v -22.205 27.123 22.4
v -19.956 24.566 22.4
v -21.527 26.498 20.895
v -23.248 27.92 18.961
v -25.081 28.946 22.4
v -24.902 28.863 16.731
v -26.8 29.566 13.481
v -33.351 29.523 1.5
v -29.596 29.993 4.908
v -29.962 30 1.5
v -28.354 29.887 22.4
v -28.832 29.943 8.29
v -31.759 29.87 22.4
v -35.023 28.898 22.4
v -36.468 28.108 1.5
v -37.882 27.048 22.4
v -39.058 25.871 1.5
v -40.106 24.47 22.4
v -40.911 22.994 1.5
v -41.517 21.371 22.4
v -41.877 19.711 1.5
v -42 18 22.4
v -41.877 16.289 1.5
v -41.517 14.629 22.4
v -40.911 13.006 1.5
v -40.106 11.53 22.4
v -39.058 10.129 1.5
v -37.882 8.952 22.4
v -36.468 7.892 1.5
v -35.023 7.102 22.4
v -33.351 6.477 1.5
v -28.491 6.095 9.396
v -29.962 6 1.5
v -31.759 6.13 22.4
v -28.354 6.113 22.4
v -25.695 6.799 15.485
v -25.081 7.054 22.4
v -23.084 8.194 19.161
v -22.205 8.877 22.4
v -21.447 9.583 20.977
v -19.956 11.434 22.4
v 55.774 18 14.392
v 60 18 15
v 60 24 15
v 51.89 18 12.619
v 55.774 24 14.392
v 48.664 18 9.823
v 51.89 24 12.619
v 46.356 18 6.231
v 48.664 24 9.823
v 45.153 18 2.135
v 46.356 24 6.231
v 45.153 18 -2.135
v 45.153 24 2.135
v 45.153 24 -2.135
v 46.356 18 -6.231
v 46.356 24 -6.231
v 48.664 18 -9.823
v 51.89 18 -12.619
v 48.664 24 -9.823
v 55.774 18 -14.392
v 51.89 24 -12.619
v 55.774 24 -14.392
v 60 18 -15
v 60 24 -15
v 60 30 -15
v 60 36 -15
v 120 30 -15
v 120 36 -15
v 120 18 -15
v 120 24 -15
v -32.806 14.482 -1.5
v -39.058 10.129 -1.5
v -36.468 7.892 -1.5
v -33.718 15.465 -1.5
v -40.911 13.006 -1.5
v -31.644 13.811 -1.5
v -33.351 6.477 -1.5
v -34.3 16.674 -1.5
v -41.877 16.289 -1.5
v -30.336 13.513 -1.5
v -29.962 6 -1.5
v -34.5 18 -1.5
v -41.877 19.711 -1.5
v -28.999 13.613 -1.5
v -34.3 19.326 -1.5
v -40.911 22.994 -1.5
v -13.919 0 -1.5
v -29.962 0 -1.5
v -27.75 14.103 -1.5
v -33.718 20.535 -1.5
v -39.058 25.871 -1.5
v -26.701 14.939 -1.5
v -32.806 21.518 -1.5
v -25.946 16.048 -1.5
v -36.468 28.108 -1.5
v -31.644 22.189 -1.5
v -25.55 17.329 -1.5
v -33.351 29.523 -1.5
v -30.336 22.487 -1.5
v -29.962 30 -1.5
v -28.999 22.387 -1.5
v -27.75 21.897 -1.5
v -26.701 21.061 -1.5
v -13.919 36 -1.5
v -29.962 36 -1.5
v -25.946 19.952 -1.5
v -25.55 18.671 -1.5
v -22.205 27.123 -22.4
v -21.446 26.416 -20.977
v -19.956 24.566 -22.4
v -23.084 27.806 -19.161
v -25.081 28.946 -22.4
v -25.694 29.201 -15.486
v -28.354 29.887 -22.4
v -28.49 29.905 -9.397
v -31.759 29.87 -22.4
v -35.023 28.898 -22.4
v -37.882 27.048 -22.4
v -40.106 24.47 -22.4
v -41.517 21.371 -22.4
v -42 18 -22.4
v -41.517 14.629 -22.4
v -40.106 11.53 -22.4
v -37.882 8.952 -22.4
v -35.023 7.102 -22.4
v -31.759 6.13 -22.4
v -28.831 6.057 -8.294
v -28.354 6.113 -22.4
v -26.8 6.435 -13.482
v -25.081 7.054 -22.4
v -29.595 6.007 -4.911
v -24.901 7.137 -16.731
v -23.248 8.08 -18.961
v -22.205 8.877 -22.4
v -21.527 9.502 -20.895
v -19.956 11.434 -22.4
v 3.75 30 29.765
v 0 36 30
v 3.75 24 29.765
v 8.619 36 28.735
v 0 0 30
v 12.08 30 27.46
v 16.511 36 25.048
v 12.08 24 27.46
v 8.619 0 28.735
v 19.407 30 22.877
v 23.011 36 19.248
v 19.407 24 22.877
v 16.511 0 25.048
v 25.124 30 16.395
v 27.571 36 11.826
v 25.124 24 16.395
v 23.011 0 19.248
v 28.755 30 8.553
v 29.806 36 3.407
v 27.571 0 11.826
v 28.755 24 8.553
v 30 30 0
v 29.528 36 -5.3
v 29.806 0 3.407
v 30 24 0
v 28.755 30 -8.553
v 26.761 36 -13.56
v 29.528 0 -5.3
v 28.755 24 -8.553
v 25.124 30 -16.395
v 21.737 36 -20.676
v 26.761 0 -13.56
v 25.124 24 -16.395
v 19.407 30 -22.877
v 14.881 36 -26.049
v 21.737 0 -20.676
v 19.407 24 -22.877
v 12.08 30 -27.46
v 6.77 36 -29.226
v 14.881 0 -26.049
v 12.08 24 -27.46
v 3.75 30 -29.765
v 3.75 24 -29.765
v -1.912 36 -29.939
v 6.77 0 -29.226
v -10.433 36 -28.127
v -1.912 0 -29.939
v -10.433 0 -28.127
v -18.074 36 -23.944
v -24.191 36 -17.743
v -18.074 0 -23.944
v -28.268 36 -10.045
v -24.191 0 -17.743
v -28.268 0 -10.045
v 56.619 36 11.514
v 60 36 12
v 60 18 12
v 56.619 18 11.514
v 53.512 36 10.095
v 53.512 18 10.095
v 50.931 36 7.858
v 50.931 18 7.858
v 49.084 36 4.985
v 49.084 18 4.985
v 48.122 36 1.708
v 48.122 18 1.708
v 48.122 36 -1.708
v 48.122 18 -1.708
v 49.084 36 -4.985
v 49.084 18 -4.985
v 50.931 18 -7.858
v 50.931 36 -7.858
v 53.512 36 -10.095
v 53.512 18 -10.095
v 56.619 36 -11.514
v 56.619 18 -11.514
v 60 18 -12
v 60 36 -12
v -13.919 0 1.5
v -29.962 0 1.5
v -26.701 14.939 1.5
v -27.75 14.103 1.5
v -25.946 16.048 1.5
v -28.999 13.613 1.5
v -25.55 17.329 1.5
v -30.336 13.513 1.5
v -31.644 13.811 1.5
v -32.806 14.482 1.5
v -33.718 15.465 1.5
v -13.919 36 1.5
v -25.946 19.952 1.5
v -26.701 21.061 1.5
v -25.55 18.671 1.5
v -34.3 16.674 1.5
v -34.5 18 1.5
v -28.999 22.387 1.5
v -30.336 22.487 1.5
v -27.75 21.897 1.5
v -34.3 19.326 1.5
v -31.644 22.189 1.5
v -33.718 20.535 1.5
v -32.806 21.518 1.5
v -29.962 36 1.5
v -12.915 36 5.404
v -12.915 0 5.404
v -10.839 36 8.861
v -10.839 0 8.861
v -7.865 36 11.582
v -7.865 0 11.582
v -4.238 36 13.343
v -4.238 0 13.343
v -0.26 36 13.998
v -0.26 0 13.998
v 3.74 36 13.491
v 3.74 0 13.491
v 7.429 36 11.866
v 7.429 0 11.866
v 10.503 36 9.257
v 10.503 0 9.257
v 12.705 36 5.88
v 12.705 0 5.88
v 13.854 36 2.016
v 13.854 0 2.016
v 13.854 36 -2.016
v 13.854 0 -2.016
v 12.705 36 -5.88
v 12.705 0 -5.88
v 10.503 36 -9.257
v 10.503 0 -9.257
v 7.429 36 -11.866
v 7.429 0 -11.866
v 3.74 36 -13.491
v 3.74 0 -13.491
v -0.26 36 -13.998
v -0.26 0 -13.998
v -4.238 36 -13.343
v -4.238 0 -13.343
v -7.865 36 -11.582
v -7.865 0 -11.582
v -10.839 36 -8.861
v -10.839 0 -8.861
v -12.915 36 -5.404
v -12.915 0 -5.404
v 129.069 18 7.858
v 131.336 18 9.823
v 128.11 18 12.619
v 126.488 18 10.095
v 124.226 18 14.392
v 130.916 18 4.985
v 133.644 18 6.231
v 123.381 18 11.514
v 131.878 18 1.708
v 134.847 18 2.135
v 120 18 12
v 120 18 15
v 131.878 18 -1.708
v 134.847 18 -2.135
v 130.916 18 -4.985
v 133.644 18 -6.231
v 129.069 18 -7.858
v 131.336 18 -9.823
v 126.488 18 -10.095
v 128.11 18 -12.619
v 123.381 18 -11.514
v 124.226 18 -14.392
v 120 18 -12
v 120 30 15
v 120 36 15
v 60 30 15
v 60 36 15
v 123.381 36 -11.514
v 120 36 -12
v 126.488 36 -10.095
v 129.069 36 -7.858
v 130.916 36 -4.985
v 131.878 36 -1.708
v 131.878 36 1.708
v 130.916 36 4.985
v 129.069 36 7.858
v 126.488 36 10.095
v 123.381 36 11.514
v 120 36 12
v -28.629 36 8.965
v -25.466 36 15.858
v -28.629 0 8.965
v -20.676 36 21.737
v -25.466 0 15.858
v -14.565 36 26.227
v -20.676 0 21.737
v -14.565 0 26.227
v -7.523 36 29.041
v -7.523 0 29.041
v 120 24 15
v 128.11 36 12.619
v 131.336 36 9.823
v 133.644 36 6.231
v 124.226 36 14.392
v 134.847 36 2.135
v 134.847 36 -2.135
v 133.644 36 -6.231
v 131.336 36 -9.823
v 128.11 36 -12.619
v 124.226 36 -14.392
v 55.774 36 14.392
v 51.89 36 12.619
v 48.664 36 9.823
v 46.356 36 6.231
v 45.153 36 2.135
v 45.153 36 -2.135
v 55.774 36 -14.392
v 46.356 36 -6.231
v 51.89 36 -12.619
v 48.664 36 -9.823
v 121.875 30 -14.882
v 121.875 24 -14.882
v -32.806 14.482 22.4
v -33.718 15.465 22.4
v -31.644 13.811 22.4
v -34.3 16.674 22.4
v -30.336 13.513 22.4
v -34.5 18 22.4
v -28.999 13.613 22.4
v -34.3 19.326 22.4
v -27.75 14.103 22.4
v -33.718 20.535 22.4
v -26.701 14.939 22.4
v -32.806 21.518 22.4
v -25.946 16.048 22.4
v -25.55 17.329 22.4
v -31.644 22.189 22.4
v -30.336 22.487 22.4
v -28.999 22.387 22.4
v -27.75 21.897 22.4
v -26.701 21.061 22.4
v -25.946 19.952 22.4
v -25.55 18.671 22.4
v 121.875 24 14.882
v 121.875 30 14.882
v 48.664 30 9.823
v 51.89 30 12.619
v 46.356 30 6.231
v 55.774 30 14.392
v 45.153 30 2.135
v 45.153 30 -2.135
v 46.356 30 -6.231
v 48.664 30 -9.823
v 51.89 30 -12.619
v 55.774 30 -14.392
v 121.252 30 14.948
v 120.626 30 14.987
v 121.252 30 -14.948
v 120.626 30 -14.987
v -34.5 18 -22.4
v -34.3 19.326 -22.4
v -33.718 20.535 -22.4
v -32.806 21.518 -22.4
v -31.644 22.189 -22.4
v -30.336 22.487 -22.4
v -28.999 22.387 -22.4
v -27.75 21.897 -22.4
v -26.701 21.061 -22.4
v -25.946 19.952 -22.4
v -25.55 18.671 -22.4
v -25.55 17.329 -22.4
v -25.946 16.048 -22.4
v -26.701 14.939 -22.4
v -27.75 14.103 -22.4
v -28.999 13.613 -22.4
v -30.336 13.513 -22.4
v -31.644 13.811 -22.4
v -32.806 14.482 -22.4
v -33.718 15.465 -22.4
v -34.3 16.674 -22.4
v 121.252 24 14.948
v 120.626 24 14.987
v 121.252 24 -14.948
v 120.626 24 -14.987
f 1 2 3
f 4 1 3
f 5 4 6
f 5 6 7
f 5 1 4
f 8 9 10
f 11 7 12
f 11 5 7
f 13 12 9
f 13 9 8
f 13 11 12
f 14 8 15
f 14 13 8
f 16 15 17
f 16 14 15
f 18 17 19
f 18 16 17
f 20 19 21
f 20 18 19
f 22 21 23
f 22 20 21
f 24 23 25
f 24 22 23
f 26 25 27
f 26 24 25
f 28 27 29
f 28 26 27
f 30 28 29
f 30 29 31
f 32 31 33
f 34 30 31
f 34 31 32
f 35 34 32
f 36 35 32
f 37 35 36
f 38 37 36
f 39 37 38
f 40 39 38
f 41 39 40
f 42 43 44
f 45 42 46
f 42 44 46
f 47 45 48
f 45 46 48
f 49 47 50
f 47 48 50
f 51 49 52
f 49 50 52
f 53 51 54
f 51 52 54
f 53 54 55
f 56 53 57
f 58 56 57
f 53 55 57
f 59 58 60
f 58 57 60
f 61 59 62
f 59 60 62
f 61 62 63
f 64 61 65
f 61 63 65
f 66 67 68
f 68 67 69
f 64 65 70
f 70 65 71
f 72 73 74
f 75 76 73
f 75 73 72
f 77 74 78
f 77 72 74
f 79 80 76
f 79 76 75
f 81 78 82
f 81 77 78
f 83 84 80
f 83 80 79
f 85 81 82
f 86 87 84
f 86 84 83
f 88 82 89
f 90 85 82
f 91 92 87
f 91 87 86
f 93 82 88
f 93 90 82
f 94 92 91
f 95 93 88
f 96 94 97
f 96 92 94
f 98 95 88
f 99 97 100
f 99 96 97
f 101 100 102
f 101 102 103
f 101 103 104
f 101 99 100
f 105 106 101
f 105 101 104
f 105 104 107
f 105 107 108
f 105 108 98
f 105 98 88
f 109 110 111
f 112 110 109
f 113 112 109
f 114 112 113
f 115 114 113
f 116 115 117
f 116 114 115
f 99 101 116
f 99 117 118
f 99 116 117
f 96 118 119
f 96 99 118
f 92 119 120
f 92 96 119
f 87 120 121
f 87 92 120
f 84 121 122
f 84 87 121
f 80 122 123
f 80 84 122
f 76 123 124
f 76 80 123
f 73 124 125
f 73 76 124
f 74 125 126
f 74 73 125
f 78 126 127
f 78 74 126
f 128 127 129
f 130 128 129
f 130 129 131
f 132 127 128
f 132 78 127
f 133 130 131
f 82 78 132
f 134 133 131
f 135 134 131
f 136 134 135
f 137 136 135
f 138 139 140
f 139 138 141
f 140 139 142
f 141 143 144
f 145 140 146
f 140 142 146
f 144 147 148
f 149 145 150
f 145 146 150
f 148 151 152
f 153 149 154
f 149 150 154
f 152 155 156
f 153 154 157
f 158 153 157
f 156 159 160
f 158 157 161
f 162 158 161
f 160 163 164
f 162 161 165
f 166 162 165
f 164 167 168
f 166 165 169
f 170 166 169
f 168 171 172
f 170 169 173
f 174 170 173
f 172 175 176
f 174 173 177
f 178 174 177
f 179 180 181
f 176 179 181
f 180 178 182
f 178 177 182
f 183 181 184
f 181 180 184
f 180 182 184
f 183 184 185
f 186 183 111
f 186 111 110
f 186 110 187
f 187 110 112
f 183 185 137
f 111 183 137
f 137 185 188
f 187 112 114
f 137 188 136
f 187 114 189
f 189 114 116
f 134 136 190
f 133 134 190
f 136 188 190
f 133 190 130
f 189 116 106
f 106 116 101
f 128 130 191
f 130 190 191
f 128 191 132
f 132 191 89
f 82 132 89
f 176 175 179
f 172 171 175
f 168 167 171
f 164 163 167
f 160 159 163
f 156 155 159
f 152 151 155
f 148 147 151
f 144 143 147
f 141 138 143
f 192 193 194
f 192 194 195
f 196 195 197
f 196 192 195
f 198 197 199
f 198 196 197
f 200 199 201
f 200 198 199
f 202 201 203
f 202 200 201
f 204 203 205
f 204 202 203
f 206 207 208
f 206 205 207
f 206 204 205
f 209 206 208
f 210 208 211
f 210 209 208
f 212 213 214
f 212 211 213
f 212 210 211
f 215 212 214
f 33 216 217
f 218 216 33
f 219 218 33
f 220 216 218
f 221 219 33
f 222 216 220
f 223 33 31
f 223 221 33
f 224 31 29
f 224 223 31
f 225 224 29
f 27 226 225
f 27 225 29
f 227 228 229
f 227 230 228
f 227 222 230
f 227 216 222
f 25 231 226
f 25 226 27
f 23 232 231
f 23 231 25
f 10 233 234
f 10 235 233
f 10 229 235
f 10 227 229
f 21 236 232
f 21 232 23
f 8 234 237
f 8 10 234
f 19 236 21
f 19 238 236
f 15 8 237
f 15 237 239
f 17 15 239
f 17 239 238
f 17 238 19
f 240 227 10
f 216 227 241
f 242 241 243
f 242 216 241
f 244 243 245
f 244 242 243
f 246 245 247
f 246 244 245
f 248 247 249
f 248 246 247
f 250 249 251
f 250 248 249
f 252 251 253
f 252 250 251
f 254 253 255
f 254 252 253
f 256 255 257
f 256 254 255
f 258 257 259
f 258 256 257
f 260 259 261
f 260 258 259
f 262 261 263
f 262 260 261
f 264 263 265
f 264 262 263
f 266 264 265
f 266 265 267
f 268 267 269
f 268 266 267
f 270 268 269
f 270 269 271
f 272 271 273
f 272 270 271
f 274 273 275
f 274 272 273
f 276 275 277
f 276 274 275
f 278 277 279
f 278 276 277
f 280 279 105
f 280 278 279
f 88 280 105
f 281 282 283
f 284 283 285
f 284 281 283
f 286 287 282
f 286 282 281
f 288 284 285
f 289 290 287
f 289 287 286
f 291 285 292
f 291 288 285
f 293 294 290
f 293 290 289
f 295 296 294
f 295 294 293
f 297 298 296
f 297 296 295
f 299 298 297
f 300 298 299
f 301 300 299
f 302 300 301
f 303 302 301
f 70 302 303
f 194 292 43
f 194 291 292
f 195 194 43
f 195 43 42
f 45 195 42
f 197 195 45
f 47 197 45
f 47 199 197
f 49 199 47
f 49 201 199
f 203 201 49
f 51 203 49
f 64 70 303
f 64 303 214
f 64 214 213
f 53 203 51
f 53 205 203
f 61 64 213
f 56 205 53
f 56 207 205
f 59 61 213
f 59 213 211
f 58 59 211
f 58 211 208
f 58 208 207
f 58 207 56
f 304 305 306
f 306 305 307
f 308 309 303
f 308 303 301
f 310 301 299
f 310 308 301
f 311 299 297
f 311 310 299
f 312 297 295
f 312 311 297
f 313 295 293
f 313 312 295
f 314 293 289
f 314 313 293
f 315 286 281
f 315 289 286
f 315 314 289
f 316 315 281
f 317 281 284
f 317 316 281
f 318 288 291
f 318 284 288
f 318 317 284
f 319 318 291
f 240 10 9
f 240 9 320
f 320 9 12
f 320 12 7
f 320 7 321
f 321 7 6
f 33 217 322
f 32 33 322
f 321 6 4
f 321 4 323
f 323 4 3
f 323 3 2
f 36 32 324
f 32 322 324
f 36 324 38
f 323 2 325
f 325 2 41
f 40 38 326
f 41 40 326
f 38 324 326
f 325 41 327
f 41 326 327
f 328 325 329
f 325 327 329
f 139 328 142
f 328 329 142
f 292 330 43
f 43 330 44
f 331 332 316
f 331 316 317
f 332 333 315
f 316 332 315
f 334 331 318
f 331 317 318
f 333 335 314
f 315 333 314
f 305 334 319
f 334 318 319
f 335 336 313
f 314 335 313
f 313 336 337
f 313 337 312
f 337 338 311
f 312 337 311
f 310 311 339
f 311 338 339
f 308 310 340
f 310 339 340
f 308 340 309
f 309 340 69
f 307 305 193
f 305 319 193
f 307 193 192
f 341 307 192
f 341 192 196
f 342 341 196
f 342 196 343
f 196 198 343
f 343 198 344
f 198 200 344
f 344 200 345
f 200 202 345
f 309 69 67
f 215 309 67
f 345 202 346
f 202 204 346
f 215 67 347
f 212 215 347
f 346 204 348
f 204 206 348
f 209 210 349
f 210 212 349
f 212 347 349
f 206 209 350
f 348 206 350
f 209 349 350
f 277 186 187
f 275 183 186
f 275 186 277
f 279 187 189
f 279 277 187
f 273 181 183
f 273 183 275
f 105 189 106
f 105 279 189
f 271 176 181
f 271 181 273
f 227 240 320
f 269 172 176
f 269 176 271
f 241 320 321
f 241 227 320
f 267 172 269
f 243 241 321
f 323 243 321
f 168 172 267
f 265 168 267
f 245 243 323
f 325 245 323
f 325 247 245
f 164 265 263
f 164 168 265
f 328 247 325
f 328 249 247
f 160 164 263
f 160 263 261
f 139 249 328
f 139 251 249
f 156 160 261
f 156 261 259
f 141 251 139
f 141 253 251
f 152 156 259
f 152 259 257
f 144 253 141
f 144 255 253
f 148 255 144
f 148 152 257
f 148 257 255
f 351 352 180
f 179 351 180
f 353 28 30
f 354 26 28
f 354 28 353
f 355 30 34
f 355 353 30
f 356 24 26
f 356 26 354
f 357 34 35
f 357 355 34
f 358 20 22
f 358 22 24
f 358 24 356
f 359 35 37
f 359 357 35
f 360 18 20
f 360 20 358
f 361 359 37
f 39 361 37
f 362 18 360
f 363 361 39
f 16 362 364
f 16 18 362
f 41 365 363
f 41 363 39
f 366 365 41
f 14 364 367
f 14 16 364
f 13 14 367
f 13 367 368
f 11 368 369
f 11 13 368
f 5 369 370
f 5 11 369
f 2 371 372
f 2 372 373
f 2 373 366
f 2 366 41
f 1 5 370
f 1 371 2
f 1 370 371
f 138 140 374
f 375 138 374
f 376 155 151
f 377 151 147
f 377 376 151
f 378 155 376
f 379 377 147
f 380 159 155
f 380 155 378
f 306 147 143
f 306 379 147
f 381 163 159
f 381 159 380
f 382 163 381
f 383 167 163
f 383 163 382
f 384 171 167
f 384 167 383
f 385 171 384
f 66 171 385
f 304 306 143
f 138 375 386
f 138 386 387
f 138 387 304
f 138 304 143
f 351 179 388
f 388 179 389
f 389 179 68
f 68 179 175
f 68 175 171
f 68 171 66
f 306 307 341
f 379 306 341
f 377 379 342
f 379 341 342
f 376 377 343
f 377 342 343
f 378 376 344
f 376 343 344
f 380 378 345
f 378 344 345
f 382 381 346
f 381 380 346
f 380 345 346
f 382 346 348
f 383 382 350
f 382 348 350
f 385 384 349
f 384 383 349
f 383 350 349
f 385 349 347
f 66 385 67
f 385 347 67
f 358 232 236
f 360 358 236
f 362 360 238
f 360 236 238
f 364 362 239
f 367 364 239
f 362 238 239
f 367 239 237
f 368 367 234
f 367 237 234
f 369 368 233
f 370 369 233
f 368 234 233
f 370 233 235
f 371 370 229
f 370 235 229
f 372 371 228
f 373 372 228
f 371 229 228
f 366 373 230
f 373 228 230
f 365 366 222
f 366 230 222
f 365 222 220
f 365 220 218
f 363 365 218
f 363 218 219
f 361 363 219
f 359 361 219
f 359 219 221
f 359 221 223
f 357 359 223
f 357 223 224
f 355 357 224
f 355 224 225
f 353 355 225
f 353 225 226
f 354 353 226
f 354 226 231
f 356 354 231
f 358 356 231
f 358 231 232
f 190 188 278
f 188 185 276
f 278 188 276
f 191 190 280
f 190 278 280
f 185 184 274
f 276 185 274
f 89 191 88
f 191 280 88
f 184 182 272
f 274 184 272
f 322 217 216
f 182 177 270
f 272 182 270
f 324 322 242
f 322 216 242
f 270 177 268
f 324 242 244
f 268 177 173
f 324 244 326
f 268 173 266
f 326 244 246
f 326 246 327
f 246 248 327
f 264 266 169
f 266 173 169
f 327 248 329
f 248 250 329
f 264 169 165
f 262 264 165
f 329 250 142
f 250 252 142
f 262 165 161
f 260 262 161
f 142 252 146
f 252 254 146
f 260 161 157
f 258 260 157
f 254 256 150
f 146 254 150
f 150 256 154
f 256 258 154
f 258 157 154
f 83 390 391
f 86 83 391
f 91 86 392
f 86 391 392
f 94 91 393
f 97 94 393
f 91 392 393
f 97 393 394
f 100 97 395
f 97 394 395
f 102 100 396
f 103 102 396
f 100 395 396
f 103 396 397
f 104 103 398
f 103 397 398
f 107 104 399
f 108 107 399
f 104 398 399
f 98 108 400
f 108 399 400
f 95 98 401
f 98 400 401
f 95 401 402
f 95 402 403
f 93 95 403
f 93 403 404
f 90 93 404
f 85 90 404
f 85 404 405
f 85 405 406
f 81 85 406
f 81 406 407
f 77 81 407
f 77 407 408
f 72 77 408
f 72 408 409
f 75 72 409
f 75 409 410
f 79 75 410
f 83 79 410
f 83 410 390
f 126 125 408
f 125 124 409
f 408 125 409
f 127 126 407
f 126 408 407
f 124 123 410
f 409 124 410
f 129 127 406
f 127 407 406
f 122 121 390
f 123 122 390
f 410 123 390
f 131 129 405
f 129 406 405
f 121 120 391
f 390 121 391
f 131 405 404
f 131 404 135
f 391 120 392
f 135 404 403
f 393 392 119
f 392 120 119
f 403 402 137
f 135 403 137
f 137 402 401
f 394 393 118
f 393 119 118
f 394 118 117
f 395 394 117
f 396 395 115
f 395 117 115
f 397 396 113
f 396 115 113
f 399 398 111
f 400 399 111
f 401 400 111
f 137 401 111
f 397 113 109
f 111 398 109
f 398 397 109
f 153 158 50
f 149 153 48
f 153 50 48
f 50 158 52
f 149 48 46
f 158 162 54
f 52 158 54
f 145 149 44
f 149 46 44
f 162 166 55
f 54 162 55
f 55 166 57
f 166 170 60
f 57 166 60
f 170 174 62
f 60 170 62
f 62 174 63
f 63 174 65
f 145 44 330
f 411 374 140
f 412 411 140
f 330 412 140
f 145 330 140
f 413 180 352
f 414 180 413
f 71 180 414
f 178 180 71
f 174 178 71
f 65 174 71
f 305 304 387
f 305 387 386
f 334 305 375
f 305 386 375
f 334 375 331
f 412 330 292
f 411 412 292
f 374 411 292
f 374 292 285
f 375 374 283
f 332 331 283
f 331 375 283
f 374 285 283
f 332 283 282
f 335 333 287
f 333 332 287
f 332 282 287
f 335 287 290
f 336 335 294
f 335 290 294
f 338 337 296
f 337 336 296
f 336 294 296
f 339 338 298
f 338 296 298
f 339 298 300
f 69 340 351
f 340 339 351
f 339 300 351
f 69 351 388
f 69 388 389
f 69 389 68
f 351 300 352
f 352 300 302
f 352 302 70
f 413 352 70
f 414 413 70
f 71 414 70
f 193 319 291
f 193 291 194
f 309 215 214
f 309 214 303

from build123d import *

# Parameters (mm, degrees)
SKETCH1_R           = 30
SKETCH1_R_2         = 14
BOSS_EXTRUDE1_DEPTH = 36
BOSS_EXTRUDE2_DEPTH = 18
BOSS_EXTRUDE3_START = -12
BOSS_EXTRUDE3_DEPTH = 6
CUT_EXTRUDE1_DEPTH  = 143.902064366
SKETCH5_R           = 12
BOSS_EXTRUDE4_DEPTH = 22.4
CUT_EXTRUDE2_DEPTH  = 143.902064412
HOLE1_D             = 9


with BuildPart() as part:
    # Sketch1 → Boss-Extrude1 (new body)
    with BuildSketch(Plane(origin=(0, 0, 0), x_dir=(1, 0, 0), z_dir=(0, 1, 0))):
        with Locations(Location((0, 0, 0), (0, 0, 270))):
            Circle(SKETCH1_R)
        with Locations(Location((0, 0, 0), (0, 0, 270))):
            Circle(SKETCH1_R_2, mode=Mode.SUBTRACT)
    extrude(amount=BOSS_EXTRUDE1_DEPTH)



with BuildPart() as body_2:
    # Sketch2 → Boss-Extrude2 (new body)
    with BuildSketch(Plane(origin=(0, 36, 0), x_dir=(1, 0, 0), z_dir=(0, 1, 0))):
        with BuildLine():
            Line((60, 15), (120, 15))
            ThreePointArc((120, 15), (135, 0), (120, -15))
            Line((120, -15), (60, -15))
            ThreePointArc((60, -15), (45, 0), (60, 15))
        make_face()
    extrude(amount=-BOSS_EXTRUDE2_DEPTH)


with BuildPart() as part_1:
    add(part.part)

    add(body_2.part)  # Boss-Extrude3 merges body 2
    # Sketch3 → Boss-Extrude3 (add)
    with BuildSketch(Plane(origin=(0, 36, 0), x_dir=(1, 0, 0), z_dir=(0, 1, 0)).offset(BOSS_EXTRUDE3_START)):
        with BuildLine():
            Line((3.75, -29.764702249), (121.875, -14.882351125))
            ThreePointArc((121.875, -14.882351125), (135, 0), (121.875, 14.882351125))
            Line((121.875, 14.882351125), (3.75, 29.764702249))
            ThreePointArc((3.75, 29.764702249), (30, 0), (3.75, -29.764702249))
        make_face()
    extrude(amount=BOSS_EXTRUDE3_DEPTH)

    # Sketch4 → Cut-Extrude1 (cut, through all)
    with BuildSketch(Plane(origin=(0, 36, 0), x_dir=(1, 0, 0), z_dir=(0, 1, 0))):
        with BuildLine():
            Line((60, 12), (120, 12))
            ThreePointArc((120, 12), (132, 0), (120, -12))
            Line((120, -12), (60, -12))
            ThreePointArc((60, -12), (48, 0), (60, 12))
        make_face()
    extrude(amount=-CUT_EXTRUDE1_DEPTH, mode=Mode.SUBTRACT)

    # Sketch5 → Boss-Extrude4 (add, symmetric)
    with BuildSketch(Plane.XY):
        with Locations((-30, 18)):
            Circle(SKETCH5_R)
    extrude(amount=BOSS_EXTRUDE4_DEPTH, both=True)

    # Sketch6 → Cut-Extrude2 (cut, through all)
    with BuildSketch(Plane(origin=(0, 36, 0), x_dir=(1, 0, 0), z_dir=(0, 1, 0))):
        with BuildLine():
            Line((-45, 1.5), (-13.919410907, 1.5))
            ThreePointArc((-13.919410907, 1.5), (-14, 0), (-13.919410907, -1.5))
            Line((-13.919410907, -1.5), (-45, -1.5))
            Line((-45, -1.5), (-45, 1.5))
        make_face()
    extrude(amount=-CUT_EXTRUDE2_DEPTH, mode=Mode.SUBTRACT)

    # Hole1 (through all)
    with Locations(Plane.XY.offset(22.4)):
        with Locations((-30, 18)):
            Hole(HOLE1_D / 2)


solid = part_1.part
